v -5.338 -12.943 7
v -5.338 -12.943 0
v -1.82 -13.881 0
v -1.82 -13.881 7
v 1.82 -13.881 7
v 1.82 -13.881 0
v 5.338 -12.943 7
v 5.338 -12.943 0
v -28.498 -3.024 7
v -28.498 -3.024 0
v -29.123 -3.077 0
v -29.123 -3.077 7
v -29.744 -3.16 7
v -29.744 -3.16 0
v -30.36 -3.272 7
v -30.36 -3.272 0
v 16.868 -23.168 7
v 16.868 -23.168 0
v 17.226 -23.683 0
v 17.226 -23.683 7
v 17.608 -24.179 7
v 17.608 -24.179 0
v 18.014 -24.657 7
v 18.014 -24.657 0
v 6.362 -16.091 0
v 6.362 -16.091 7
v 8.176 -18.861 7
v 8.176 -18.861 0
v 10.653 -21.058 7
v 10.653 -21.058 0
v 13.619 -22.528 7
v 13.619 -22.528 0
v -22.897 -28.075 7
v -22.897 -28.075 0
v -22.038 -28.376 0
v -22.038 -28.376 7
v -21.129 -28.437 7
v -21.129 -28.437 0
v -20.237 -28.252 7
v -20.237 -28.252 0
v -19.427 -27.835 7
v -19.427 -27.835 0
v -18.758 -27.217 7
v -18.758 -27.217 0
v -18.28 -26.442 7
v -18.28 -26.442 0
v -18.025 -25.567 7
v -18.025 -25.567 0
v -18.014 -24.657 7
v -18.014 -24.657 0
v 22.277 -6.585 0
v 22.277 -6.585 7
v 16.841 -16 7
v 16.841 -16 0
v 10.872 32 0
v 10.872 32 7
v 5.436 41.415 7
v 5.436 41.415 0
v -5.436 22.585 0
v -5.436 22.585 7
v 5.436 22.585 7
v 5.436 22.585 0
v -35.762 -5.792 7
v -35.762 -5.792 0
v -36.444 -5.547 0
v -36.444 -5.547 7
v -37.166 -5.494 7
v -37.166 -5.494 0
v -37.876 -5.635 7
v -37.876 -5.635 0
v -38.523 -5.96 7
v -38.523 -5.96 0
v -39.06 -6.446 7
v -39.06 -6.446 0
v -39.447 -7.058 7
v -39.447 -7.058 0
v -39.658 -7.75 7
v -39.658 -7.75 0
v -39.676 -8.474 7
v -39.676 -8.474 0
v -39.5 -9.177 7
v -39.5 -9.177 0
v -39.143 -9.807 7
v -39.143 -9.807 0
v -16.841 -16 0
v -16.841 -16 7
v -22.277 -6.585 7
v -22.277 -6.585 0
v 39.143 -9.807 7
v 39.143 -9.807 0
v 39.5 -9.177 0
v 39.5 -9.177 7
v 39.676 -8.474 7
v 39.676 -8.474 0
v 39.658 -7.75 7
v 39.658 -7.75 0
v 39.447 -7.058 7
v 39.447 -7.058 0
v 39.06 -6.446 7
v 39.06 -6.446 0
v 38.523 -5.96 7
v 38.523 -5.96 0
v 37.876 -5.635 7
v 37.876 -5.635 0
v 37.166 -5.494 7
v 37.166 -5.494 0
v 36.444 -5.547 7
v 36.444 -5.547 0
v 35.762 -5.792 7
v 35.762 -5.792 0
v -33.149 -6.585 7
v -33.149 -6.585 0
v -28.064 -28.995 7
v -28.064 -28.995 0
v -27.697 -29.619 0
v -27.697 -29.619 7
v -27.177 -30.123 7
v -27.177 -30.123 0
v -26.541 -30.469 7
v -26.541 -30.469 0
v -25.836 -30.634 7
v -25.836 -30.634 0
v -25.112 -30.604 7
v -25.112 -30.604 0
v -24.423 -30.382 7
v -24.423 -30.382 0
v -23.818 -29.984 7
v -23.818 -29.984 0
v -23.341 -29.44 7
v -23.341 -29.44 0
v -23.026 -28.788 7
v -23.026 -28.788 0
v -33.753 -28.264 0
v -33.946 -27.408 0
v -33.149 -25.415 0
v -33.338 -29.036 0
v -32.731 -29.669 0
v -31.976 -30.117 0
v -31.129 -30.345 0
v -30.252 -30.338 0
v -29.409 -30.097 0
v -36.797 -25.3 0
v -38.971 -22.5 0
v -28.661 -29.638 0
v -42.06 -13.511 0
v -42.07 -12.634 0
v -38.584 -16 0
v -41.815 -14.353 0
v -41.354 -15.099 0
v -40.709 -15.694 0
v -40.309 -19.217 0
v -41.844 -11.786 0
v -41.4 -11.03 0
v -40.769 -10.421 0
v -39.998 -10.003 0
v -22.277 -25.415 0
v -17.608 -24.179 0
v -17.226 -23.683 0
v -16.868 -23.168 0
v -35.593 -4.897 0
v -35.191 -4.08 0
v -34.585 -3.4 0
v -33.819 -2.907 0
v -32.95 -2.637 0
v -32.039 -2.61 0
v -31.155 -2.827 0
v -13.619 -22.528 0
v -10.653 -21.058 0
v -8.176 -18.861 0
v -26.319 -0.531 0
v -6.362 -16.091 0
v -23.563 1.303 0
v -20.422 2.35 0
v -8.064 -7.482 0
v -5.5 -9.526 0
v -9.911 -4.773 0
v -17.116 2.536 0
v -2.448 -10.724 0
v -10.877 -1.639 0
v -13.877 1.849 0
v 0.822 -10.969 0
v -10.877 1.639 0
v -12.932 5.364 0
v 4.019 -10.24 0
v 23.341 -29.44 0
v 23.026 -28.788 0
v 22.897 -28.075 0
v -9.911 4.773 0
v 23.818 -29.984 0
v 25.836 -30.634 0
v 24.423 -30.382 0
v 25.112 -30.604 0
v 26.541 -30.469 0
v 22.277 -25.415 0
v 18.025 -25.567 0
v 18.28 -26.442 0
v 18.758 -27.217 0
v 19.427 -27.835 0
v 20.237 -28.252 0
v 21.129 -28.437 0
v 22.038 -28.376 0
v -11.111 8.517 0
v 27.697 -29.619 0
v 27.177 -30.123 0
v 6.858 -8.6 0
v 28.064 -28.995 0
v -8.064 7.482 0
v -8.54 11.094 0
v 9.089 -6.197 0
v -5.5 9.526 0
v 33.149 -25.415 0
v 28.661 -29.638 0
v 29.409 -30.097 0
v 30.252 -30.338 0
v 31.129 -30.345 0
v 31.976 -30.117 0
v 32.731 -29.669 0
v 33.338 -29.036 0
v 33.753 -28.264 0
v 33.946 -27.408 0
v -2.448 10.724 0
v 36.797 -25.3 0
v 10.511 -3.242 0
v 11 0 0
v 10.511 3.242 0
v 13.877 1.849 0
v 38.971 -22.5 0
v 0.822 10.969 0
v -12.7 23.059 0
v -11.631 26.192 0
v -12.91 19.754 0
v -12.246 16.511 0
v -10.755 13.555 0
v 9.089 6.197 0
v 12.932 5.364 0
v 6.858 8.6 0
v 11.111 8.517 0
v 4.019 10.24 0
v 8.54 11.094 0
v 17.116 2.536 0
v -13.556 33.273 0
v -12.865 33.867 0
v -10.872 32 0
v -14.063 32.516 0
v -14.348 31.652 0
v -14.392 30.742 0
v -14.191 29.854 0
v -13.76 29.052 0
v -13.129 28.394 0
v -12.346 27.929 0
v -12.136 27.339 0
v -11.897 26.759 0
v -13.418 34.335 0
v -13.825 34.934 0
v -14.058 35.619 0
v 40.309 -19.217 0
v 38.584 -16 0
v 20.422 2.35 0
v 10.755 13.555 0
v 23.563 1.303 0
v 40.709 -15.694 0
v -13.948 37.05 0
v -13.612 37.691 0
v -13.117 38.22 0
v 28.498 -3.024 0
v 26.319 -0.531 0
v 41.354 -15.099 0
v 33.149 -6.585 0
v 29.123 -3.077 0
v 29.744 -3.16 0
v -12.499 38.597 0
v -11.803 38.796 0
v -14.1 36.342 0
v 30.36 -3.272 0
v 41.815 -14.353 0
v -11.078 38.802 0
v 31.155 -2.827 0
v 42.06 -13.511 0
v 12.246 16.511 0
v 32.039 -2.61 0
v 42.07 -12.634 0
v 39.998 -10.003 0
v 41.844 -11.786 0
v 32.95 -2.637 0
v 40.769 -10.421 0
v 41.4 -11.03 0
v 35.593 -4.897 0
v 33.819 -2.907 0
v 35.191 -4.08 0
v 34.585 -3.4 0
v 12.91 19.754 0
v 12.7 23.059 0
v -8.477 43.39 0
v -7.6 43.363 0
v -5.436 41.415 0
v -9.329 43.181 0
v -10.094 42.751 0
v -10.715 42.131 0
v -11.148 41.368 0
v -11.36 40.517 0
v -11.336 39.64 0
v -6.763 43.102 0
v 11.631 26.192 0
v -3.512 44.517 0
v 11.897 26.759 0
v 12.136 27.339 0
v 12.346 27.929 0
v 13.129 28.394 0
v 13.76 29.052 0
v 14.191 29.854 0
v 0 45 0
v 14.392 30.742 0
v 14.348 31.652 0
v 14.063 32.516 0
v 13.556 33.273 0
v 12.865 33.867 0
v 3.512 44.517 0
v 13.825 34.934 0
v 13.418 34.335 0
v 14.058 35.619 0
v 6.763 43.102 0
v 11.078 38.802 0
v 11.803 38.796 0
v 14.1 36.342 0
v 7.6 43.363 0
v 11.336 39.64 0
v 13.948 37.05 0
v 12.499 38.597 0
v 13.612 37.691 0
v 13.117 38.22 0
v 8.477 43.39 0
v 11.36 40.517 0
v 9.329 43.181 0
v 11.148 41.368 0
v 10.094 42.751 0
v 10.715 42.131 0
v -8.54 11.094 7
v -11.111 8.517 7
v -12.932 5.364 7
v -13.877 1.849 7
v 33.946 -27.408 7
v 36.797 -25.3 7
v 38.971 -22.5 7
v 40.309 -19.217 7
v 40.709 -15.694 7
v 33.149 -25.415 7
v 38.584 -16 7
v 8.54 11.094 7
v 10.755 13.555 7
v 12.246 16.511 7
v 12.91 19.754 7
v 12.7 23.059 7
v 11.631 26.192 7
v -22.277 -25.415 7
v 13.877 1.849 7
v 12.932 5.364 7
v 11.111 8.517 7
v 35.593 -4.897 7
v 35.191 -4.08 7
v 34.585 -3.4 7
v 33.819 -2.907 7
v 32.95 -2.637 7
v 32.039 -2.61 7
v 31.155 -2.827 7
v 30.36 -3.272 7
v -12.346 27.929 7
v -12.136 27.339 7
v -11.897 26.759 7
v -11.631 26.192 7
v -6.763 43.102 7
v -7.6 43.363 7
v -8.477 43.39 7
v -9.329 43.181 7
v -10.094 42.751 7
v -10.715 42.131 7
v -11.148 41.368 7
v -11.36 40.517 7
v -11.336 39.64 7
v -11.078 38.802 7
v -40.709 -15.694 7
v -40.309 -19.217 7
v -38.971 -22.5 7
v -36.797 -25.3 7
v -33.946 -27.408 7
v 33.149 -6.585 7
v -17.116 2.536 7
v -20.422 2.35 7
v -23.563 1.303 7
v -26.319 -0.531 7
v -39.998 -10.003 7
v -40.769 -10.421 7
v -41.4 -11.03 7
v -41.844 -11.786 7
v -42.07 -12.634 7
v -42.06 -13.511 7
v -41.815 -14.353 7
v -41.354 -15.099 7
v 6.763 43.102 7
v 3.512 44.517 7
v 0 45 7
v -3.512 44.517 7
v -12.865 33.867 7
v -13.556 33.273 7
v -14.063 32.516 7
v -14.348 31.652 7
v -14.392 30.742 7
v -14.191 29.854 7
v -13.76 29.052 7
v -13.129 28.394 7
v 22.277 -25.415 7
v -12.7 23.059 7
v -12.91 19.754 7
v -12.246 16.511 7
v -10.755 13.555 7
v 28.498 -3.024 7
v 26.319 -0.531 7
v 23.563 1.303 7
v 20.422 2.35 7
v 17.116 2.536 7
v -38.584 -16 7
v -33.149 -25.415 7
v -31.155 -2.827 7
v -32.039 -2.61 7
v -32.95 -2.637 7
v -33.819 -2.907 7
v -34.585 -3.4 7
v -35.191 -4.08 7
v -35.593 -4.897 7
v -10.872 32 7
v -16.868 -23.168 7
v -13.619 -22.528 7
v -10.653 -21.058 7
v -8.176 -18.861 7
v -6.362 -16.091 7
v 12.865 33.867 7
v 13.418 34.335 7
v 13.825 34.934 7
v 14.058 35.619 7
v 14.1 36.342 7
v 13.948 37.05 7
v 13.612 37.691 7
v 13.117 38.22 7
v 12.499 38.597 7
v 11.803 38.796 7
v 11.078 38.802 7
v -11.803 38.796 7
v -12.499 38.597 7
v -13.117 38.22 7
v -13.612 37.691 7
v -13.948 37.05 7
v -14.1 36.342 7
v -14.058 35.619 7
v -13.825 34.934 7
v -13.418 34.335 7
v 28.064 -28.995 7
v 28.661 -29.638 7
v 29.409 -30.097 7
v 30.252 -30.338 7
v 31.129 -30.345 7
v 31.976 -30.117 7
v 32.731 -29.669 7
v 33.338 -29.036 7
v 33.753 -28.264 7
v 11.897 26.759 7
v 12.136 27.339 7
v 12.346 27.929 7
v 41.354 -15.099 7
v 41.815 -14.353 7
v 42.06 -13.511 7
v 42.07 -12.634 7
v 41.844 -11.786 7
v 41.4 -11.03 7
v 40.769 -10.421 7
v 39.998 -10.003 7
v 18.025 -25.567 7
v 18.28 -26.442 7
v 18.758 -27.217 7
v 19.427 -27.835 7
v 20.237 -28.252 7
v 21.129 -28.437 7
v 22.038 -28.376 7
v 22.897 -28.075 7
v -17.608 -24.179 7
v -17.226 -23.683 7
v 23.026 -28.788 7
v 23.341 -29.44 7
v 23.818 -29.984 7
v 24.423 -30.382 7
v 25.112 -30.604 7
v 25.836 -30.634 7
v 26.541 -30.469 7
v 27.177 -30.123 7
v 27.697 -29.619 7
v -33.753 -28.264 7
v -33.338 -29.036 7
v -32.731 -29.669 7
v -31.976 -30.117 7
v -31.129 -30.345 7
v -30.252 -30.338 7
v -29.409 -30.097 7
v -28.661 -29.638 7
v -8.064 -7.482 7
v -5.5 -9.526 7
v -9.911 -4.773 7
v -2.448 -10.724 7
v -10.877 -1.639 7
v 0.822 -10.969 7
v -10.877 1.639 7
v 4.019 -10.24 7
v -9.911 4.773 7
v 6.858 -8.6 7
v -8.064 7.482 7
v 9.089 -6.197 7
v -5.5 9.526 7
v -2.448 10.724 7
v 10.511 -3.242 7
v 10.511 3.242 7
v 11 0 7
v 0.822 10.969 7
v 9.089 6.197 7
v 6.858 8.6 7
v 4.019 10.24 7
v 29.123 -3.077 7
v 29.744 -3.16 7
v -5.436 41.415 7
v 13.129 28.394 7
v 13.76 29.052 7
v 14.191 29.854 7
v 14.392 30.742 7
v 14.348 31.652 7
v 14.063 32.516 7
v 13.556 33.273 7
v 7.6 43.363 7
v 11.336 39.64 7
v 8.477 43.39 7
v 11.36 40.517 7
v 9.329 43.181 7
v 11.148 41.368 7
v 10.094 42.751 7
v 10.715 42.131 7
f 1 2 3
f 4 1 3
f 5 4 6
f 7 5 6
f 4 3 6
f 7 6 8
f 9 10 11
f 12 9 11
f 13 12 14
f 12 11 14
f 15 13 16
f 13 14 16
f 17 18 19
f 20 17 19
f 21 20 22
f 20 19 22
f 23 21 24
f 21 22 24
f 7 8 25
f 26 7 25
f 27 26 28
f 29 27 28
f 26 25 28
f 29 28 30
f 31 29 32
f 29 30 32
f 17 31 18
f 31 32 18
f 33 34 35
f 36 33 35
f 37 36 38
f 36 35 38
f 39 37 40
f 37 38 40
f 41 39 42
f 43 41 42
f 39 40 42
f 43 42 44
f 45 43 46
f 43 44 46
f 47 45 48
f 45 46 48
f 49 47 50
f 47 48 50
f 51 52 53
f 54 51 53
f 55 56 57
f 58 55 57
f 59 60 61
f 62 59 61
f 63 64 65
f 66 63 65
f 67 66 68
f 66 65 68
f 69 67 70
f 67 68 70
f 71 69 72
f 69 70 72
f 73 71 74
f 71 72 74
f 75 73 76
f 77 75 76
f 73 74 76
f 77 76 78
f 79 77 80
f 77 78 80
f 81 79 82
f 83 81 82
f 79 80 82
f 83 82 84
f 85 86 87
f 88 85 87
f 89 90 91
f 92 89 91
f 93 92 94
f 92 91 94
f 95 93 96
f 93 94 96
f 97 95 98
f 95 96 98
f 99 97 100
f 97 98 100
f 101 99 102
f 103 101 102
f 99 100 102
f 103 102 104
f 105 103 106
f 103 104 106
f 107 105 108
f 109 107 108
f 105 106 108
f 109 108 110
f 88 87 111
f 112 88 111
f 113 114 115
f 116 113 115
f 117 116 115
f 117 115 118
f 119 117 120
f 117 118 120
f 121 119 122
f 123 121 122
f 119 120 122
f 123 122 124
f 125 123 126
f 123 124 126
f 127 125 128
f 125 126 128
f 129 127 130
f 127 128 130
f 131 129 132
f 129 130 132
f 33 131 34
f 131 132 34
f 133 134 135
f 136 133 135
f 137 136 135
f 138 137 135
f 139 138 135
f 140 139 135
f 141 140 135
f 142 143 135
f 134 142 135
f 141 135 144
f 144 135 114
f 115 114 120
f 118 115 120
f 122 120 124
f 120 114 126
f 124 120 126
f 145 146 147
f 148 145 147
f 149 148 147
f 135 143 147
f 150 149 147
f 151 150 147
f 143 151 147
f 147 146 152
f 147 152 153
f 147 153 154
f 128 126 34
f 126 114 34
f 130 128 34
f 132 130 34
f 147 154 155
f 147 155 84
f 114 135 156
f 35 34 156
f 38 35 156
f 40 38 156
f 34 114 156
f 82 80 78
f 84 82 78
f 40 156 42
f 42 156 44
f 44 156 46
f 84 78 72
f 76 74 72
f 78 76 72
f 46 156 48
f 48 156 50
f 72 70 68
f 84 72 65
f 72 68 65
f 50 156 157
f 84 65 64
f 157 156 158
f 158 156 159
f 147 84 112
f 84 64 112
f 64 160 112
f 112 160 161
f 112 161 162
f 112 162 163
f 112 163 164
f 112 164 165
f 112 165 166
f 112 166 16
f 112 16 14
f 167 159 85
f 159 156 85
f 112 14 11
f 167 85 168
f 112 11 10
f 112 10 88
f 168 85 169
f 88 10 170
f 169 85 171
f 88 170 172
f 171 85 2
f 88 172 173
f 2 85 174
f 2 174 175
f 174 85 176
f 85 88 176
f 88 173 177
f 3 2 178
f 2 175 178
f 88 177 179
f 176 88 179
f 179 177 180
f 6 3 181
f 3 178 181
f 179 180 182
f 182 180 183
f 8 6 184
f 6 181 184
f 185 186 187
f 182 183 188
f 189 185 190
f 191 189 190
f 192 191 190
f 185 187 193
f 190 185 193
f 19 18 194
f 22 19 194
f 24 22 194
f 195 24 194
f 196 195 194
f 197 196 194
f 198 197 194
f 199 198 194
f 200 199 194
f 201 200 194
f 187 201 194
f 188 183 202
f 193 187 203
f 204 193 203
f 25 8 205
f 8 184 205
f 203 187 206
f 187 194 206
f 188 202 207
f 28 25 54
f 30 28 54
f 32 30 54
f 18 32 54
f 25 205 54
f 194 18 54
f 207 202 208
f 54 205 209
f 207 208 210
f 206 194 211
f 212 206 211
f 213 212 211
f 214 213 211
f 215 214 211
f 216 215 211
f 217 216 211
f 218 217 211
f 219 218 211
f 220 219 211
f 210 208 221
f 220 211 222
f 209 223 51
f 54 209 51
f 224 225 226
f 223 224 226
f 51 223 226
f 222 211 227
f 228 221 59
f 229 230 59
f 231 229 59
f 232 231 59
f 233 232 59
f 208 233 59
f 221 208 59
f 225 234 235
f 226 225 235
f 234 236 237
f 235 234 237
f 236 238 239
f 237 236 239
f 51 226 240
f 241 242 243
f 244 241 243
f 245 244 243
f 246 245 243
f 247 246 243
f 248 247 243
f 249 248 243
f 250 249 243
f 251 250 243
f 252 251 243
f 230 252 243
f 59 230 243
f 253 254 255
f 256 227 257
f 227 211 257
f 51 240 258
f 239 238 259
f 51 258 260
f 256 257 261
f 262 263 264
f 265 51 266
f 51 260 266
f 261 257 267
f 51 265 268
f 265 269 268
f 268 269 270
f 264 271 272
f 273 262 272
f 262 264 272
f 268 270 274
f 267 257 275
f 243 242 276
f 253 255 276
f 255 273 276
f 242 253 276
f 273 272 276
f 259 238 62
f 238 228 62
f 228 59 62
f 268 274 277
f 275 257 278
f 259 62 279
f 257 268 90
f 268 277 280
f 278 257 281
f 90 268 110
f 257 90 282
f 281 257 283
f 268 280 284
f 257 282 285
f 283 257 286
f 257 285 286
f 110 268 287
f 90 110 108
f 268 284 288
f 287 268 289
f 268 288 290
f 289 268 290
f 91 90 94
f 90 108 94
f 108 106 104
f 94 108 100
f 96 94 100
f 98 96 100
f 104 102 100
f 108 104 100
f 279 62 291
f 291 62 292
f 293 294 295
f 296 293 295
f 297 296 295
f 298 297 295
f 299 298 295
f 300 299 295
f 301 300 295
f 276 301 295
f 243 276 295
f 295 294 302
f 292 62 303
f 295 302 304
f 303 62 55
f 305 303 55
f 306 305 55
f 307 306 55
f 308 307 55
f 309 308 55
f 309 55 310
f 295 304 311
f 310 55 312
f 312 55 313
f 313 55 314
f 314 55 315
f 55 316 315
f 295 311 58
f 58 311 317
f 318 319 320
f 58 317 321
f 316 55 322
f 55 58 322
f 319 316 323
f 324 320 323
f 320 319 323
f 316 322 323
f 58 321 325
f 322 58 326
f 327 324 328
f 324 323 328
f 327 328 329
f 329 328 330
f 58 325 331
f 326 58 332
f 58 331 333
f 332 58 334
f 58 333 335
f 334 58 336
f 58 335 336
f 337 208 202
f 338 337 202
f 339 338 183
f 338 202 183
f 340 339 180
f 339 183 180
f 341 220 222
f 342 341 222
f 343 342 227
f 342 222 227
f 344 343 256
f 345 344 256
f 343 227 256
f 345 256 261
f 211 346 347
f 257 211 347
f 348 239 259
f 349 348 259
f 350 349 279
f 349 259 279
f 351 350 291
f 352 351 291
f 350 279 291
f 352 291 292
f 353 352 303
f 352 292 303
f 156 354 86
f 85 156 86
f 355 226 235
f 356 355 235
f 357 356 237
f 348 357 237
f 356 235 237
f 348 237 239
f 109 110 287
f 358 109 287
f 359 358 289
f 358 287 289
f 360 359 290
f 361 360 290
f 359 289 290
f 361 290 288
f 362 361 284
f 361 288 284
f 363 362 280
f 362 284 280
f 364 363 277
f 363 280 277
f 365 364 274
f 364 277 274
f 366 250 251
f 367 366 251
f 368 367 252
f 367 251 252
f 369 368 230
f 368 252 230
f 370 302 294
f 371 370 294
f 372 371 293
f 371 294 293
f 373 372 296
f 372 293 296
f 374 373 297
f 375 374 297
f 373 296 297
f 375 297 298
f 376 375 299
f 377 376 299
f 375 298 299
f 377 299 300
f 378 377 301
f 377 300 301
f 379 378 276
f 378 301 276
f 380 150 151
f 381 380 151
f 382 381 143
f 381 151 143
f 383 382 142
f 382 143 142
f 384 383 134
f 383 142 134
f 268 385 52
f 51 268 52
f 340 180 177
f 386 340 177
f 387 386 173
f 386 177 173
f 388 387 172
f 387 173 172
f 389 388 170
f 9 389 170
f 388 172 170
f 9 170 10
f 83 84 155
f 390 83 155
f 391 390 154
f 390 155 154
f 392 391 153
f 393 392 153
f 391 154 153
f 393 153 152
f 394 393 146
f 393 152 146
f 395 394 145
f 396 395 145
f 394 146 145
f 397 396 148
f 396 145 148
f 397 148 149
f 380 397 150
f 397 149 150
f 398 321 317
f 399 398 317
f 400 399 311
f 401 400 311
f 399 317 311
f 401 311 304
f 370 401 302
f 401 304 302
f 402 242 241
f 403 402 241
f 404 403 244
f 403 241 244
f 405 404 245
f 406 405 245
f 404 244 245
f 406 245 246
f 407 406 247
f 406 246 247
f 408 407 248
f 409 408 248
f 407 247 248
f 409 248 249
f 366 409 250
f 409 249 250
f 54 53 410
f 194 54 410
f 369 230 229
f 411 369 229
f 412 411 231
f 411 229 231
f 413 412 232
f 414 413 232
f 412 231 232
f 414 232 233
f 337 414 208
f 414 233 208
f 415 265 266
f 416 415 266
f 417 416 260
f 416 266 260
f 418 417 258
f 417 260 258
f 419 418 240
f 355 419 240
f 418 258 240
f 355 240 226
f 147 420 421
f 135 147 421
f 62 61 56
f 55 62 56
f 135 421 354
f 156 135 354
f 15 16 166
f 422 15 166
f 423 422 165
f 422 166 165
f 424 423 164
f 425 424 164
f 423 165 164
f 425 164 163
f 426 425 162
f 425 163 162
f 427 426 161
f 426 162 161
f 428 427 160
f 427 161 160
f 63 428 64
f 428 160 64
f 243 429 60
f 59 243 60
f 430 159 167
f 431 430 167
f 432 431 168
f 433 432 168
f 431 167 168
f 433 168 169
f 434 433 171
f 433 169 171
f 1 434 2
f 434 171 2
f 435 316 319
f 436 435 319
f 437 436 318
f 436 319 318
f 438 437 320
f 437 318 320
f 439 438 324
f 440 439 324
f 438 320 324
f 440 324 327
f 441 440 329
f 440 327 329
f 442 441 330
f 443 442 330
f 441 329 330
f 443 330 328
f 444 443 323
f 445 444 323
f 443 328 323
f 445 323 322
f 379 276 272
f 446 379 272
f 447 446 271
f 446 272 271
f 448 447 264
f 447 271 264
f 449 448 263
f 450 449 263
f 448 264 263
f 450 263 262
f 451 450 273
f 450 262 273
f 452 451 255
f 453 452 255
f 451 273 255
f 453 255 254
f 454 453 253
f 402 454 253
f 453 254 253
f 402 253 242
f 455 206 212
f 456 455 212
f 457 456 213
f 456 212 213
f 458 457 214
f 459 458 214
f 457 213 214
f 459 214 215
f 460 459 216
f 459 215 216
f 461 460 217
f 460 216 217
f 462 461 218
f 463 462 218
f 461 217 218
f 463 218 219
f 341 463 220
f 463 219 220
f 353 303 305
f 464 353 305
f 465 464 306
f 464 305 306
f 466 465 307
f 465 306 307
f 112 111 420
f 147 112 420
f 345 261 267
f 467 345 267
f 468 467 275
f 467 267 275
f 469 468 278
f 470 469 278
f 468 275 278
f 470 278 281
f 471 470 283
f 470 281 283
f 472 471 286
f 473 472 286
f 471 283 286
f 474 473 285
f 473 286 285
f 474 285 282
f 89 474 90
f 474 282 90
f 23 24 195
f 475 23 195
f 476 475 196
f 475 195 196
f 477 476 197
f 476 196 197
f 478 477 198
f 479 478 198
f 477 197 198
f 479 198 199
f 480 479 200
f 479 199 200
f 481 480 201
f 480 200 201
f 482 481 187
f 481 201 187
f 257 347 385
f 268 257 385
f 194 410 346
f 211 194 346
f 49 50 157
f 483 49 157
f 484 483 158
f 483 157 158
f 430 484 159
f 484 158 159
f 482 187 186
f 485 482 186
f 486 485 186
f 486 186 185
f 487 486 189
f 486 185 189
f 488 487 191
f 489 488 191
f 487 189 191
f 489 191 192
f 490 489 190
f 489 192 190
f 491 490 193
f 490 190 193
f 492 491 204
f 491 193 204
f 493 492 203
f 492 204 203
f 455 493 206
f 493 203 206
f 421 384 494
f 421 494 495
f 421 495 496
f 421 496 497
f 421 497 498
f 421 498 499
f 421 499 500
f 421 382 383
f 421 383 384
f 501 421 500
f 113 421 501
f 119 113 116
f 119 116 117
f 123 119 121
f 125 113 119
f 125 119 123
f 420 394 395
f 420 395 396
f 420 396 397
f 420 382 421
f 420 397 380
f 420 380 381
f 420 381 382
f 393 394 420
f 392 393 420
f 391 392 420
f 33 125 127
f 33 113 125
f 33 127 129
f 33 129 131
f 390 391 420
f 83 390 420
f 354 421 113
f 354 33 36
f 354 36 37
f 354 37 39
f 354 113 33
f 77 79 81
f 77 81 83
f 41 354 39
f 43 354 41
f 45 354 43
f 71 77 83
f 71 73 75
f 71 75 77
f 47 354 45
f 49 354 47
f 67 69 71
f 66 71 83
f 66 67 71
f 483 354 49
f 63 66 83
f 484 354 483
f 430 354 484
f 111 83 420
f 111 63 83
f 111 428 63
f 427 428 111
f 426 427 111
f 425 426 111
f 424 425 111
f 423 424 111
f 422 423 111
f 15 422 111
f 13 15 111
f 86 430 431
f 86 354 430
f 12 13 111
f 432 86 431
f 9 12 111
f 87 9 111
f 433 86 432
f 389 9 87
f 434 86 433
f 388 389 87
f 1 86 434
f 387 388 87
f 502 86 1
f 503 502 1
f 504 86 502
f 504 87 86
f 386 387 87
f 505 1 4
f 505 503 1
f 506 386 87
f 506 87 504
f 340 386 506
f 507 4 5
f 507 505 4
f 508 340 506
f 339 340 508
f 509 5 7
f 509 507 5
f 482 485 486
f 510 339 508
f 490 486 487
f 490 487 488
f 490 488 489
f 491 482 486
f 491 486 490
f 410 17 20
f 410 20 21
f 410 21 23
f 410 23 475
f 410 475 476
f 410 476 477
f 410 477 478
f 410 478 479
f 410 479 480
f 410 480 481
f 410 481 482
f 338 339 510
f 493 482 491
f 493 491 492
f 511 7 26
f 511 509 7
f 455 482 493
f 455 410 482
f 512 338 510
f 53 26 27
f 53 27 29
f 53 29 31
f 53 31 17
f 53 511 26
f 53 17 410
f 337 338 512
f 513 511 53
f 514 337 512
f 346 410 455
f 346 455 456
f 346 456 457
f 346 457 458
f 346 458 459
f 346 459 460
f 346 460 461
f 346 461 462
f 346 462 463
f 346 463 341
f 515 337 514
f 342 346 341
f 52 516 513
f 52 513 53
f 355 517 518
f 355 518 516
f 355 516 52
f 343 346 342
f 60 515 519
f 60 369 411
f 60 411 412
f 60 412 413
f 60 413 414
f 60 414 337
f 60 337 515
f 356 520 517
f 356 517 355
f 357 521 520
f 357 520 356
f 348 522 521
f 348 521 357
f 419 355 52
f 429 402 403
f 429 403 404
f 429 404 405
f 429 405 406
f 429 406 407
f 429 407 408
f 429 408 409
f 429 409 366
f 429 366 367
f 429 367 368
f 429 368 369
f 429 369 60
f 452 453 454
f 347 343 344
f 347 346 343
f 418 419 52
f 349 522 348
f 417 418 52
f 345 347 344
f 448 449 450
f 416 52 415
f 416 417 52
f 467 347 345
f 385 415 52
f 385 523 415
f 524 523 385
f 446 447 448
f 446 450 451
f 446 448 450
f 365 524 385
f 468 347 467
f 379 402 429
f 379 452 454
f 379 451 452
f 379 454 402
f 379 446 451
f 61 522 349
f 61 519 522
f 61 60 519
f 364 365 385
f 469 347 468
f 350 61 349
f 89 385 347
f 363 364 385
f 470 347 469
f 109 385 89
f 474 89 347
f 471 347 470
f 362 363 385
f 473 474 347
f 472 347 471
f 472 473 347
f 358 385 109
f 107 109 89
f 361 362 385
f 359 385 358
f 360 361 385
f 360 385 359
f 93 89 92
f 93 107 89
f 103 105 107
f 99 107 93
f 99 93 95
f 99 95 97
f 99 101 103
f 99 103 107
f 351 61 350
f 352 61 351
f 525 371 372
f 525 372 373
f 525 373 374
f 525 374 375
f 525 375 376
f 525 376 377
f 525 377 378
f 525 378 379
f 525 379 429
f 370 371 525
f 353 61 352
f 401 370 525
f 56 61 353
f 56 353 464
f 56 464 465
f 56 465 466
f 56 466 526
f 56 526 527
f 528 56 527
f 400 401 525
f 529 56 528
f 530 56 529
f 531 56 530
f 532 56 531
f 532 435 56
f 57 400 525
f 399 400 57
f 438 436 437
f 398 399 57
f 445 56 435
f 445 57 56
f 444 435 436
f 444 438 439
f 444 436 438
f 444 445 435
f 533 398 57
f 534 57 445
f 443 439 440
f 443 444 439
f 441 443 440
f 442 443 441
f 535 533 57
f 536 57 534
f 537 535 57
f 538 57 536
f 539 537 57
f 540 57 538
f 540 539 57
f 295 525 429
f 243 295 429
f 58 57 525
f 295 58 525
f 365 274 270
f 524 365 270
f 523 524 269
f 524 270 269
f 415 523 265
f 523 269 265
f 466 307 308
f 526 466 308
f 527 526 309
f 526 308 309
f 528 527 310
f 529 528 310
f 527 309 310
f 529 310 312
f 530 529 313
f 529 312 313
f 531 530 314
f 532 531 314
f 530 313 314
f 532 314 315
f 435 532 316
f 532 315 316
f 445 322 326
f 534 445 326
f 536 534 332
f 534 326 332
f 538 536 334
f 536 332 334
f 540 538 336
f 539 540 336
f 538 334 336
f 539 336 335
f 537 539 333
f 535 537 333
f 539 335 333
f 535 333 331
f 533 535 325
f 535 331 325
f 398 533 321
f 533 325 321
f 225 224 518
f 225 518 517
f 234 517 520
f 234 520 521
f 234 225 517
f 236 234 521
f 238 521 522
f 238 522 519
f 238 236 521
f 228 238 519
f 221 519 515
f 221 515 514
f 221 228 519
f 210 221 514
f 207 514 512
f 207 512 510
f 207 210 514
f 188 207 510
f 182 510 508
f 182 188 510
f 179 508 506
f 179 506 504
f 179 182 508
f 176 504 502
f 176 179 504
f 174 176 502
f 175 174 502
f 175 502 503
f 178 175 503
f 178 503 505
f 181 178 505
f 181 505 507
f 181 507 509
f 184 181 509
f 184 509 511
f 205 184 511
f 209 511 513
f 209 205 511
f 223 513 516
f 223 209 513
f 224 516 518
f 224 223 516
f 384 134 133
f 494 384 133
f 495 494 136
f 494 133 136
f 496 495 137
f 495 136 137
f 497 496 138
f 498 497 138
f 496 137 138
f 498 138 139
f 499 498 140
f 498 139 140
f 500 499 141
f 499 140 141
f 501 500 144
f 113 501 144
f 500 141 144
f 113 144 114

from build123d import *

# Parameters (mm, degrees)
F0_R     = 11
F1_DEPTH = 7
F3_DEPTH = 25


with BuildPart() as f1:
    # F0 (on Top) → F1 (new body)
    with BuildSketch(Plane.XY):
        with BuildLine():
            ThreePointArc((-16.867813, -23.168401), (-9.341205, -20.041676), (-5.337589, -12.942571))
            ThreePointArc((-5.337589, -12.942571), (-12.124356, -7), (-13.87739, 1.848798))
            ThreePointArc((-13.87739, 1.848798), (-22.027203, 1.931118), (-28.49833, -3.023754))
            ThreePointArc((-28.49833, -3.023754), (-29.433898, -3.114432), (-30.360469, -3.272474))
            ThreePointArc((-30.360469, -3.272474), (-33.819311, -2.907046), (-35.762261, -5.791847))
            ThreePointArc((-35.762261, -5.791847), (-39.059816, -6.445953), (-39.142749, -9.806733))
            ThreePointArc((-39.142749, -9.806733), (-41.985912, -12.202508), (-40.709221, -15.694408))
            ThreePointArc((-40.709221, -15.694408), (-38.971143, -22.5), (-33.946366, -27.408015))
            ThreePointArc((-33.946366, -27.408015), (-31.560638, -30.259612), (-28.064255, -28.995249))
            ThreePointArc((-28.064255, -28.995249), (-25.112267, -30.603816), (-22.897017, -28.075103))
            ThreePointArc((-22.897017, -28.075103), (-19.427231, -27.83486), (-18.01428, -24.6567))
            ThreePointArc((-18.01428, -24.6567), (-17.414126, -23.933288), (-16.867813, -23.168401))
        make_face()
        with BuildLine():
            ThreePointArc((5.337589, -12.942571), (11.634566, -7.786968), (14, 0))
            ThreePointArc((14, 0), (13.969314, 0.92643), (13.87739, 1.848798))
            ThreePointArc((13.87739, 1.848798), (12.124356, 7), (8.539801, 11.093773))
            ThreePointArc((8.539801, 11.093773), (0, 14), (-8.539801, 11.093773))
            ThreePointArc((-8.539801, 11.093773), (-12.124356, 7), (-13.87739, 1.848798))
            ThreePointArc((-13.87739, 1.848798), (-12.124356, -7), (-5.337589, -12.942571))
            ThreePointArc((-5.337589, -12.942571), (0, -14), (5.337589, -12.942571))
        make_face()
        Circle(F0_R, mode=Mode.SUBTRACT)
        with BuildLine():
            ThreePointArc((13.87739, 1.848798), (13.969314, 0.92643), (14, 0))
            ThreePointArc((14, 0), (11.634566, -7.786968), (5.337589, -12.942571))
            ThreePointArc((5.337589, -12.942571), (9.341205, -20.041676), (16.867813, -23.168401))
            ThreePointArc((16.867813, -23.168401), (17.414126, -23.933288), (18.01428, -24.6567))
            ThreePointArc((18.01428, -24.6567), (19.427231, -27.83486), (22.897017, -28.075103))
            ThreePointArc((22.897017, -28.075103), (25.112267, -30.603816), (28.064255, -28.995249))
            ThreePointArc((28.064255, -28.995249), (31.560638, -30.259612), (33.946366, -27.408015))
            ThreePointArc((33.946366, -27.408015), (38.971143, -22.5), (40.709221, -15.694408))
            ThreePointArc((40.709221, -15.694408), (41.985912, -12.202508), (39.142749, -9.806733))
            ThreePointArc((39.142749, -9.806733), (39.059816, -6.445953), (35.762261, -5.791847))
            ThreePointArc((35.762261, -5.791847), (33.819311, -2.907046), (30.360469, -3.272474))
            ThreePointArc((30.360469, -3.272474), (29.433898, -3.114432), (28.49833, -3.023754))
            ThreePointArc((28.49833, -3.023754), (22.027203, 1.931118), (13.87739, 1.848798))
        make_face()
        with BuildLine():
            ThreePointArc((-8.539801, 11.093773), (0, 14), (8.539801, 11.093773))
            ThreePointArc((8.539801, 11.093773), (12.685998, 18.110559), (11.630517, 26.192155))
            ThreePointArc((11.630517, 26.192155), (12.019772, 27.04772), (12.346189, 27.929174))
            ThreePointArc((12.346189, 27.929174), (14.39208, 30.741906), (12.865244, 33.86695))
            ThreePointArc((12.865244, 33.86695), (13.947549, 37.049769), (11.078495, 38.801982))
            ThreePointArc((11.078495, 38.801982), (10.425274, 42.46212), (6.762854, 43.102423))
            ThreePointArc((6.762854, 43.102423), (0, 45), (-6.762854, 43.102423))
            ThreePointArc((-6.762854, 43.102423), (-10.425274, 42.46212), (-11.078495, 38.801982))
            ThreePointArc((-11.078495, 38.801982), (-13.947549, 37.049769), (-12.865244, 33.86695))
            ThreePointArc((-12.865244, 33.86695), (-14.39208, 30.741906), (-12.346189, 27.929174))
            ThreePointArc((-12.346189, 27.929174), (-12.019772, 27.04772), (-11.630517, 26.192155))
            ThreePointArc((-11.630517, 26.192155), (-12.685998, 18.110559), (-8.539801, 11.093773))
        make_face()
    extrude(amount=F1_DEPTH)

    # F2 (on face) → F3 (cut)
    with BuildSketch(Plane.XY.offset(7)):
        Polygon((5.435753, 41.415), (-5.435753, 41.415), (-10.871506, 32), (-5.435753, 22.585), (5.435753, 22.585), (10.871506, 32), align=None)
        Polygon((-38.584318, -16), (-33.148566, -25.415), (-22.27706, -25.415), (-16.841307, -16), (-22.27706, -6.585), (-33.148566, -6.585), align=None)
        Polygon((33.148566, -25.415), (38.584318, -16), (33.148566, -6.585), (22.27706, -6.585), (16.841307, -16), (22.27706, -25.415), align=None)
    extrude(amount=-F3_DEPTH, mode=Mode.SUBTRACT)


solid = f1.part
